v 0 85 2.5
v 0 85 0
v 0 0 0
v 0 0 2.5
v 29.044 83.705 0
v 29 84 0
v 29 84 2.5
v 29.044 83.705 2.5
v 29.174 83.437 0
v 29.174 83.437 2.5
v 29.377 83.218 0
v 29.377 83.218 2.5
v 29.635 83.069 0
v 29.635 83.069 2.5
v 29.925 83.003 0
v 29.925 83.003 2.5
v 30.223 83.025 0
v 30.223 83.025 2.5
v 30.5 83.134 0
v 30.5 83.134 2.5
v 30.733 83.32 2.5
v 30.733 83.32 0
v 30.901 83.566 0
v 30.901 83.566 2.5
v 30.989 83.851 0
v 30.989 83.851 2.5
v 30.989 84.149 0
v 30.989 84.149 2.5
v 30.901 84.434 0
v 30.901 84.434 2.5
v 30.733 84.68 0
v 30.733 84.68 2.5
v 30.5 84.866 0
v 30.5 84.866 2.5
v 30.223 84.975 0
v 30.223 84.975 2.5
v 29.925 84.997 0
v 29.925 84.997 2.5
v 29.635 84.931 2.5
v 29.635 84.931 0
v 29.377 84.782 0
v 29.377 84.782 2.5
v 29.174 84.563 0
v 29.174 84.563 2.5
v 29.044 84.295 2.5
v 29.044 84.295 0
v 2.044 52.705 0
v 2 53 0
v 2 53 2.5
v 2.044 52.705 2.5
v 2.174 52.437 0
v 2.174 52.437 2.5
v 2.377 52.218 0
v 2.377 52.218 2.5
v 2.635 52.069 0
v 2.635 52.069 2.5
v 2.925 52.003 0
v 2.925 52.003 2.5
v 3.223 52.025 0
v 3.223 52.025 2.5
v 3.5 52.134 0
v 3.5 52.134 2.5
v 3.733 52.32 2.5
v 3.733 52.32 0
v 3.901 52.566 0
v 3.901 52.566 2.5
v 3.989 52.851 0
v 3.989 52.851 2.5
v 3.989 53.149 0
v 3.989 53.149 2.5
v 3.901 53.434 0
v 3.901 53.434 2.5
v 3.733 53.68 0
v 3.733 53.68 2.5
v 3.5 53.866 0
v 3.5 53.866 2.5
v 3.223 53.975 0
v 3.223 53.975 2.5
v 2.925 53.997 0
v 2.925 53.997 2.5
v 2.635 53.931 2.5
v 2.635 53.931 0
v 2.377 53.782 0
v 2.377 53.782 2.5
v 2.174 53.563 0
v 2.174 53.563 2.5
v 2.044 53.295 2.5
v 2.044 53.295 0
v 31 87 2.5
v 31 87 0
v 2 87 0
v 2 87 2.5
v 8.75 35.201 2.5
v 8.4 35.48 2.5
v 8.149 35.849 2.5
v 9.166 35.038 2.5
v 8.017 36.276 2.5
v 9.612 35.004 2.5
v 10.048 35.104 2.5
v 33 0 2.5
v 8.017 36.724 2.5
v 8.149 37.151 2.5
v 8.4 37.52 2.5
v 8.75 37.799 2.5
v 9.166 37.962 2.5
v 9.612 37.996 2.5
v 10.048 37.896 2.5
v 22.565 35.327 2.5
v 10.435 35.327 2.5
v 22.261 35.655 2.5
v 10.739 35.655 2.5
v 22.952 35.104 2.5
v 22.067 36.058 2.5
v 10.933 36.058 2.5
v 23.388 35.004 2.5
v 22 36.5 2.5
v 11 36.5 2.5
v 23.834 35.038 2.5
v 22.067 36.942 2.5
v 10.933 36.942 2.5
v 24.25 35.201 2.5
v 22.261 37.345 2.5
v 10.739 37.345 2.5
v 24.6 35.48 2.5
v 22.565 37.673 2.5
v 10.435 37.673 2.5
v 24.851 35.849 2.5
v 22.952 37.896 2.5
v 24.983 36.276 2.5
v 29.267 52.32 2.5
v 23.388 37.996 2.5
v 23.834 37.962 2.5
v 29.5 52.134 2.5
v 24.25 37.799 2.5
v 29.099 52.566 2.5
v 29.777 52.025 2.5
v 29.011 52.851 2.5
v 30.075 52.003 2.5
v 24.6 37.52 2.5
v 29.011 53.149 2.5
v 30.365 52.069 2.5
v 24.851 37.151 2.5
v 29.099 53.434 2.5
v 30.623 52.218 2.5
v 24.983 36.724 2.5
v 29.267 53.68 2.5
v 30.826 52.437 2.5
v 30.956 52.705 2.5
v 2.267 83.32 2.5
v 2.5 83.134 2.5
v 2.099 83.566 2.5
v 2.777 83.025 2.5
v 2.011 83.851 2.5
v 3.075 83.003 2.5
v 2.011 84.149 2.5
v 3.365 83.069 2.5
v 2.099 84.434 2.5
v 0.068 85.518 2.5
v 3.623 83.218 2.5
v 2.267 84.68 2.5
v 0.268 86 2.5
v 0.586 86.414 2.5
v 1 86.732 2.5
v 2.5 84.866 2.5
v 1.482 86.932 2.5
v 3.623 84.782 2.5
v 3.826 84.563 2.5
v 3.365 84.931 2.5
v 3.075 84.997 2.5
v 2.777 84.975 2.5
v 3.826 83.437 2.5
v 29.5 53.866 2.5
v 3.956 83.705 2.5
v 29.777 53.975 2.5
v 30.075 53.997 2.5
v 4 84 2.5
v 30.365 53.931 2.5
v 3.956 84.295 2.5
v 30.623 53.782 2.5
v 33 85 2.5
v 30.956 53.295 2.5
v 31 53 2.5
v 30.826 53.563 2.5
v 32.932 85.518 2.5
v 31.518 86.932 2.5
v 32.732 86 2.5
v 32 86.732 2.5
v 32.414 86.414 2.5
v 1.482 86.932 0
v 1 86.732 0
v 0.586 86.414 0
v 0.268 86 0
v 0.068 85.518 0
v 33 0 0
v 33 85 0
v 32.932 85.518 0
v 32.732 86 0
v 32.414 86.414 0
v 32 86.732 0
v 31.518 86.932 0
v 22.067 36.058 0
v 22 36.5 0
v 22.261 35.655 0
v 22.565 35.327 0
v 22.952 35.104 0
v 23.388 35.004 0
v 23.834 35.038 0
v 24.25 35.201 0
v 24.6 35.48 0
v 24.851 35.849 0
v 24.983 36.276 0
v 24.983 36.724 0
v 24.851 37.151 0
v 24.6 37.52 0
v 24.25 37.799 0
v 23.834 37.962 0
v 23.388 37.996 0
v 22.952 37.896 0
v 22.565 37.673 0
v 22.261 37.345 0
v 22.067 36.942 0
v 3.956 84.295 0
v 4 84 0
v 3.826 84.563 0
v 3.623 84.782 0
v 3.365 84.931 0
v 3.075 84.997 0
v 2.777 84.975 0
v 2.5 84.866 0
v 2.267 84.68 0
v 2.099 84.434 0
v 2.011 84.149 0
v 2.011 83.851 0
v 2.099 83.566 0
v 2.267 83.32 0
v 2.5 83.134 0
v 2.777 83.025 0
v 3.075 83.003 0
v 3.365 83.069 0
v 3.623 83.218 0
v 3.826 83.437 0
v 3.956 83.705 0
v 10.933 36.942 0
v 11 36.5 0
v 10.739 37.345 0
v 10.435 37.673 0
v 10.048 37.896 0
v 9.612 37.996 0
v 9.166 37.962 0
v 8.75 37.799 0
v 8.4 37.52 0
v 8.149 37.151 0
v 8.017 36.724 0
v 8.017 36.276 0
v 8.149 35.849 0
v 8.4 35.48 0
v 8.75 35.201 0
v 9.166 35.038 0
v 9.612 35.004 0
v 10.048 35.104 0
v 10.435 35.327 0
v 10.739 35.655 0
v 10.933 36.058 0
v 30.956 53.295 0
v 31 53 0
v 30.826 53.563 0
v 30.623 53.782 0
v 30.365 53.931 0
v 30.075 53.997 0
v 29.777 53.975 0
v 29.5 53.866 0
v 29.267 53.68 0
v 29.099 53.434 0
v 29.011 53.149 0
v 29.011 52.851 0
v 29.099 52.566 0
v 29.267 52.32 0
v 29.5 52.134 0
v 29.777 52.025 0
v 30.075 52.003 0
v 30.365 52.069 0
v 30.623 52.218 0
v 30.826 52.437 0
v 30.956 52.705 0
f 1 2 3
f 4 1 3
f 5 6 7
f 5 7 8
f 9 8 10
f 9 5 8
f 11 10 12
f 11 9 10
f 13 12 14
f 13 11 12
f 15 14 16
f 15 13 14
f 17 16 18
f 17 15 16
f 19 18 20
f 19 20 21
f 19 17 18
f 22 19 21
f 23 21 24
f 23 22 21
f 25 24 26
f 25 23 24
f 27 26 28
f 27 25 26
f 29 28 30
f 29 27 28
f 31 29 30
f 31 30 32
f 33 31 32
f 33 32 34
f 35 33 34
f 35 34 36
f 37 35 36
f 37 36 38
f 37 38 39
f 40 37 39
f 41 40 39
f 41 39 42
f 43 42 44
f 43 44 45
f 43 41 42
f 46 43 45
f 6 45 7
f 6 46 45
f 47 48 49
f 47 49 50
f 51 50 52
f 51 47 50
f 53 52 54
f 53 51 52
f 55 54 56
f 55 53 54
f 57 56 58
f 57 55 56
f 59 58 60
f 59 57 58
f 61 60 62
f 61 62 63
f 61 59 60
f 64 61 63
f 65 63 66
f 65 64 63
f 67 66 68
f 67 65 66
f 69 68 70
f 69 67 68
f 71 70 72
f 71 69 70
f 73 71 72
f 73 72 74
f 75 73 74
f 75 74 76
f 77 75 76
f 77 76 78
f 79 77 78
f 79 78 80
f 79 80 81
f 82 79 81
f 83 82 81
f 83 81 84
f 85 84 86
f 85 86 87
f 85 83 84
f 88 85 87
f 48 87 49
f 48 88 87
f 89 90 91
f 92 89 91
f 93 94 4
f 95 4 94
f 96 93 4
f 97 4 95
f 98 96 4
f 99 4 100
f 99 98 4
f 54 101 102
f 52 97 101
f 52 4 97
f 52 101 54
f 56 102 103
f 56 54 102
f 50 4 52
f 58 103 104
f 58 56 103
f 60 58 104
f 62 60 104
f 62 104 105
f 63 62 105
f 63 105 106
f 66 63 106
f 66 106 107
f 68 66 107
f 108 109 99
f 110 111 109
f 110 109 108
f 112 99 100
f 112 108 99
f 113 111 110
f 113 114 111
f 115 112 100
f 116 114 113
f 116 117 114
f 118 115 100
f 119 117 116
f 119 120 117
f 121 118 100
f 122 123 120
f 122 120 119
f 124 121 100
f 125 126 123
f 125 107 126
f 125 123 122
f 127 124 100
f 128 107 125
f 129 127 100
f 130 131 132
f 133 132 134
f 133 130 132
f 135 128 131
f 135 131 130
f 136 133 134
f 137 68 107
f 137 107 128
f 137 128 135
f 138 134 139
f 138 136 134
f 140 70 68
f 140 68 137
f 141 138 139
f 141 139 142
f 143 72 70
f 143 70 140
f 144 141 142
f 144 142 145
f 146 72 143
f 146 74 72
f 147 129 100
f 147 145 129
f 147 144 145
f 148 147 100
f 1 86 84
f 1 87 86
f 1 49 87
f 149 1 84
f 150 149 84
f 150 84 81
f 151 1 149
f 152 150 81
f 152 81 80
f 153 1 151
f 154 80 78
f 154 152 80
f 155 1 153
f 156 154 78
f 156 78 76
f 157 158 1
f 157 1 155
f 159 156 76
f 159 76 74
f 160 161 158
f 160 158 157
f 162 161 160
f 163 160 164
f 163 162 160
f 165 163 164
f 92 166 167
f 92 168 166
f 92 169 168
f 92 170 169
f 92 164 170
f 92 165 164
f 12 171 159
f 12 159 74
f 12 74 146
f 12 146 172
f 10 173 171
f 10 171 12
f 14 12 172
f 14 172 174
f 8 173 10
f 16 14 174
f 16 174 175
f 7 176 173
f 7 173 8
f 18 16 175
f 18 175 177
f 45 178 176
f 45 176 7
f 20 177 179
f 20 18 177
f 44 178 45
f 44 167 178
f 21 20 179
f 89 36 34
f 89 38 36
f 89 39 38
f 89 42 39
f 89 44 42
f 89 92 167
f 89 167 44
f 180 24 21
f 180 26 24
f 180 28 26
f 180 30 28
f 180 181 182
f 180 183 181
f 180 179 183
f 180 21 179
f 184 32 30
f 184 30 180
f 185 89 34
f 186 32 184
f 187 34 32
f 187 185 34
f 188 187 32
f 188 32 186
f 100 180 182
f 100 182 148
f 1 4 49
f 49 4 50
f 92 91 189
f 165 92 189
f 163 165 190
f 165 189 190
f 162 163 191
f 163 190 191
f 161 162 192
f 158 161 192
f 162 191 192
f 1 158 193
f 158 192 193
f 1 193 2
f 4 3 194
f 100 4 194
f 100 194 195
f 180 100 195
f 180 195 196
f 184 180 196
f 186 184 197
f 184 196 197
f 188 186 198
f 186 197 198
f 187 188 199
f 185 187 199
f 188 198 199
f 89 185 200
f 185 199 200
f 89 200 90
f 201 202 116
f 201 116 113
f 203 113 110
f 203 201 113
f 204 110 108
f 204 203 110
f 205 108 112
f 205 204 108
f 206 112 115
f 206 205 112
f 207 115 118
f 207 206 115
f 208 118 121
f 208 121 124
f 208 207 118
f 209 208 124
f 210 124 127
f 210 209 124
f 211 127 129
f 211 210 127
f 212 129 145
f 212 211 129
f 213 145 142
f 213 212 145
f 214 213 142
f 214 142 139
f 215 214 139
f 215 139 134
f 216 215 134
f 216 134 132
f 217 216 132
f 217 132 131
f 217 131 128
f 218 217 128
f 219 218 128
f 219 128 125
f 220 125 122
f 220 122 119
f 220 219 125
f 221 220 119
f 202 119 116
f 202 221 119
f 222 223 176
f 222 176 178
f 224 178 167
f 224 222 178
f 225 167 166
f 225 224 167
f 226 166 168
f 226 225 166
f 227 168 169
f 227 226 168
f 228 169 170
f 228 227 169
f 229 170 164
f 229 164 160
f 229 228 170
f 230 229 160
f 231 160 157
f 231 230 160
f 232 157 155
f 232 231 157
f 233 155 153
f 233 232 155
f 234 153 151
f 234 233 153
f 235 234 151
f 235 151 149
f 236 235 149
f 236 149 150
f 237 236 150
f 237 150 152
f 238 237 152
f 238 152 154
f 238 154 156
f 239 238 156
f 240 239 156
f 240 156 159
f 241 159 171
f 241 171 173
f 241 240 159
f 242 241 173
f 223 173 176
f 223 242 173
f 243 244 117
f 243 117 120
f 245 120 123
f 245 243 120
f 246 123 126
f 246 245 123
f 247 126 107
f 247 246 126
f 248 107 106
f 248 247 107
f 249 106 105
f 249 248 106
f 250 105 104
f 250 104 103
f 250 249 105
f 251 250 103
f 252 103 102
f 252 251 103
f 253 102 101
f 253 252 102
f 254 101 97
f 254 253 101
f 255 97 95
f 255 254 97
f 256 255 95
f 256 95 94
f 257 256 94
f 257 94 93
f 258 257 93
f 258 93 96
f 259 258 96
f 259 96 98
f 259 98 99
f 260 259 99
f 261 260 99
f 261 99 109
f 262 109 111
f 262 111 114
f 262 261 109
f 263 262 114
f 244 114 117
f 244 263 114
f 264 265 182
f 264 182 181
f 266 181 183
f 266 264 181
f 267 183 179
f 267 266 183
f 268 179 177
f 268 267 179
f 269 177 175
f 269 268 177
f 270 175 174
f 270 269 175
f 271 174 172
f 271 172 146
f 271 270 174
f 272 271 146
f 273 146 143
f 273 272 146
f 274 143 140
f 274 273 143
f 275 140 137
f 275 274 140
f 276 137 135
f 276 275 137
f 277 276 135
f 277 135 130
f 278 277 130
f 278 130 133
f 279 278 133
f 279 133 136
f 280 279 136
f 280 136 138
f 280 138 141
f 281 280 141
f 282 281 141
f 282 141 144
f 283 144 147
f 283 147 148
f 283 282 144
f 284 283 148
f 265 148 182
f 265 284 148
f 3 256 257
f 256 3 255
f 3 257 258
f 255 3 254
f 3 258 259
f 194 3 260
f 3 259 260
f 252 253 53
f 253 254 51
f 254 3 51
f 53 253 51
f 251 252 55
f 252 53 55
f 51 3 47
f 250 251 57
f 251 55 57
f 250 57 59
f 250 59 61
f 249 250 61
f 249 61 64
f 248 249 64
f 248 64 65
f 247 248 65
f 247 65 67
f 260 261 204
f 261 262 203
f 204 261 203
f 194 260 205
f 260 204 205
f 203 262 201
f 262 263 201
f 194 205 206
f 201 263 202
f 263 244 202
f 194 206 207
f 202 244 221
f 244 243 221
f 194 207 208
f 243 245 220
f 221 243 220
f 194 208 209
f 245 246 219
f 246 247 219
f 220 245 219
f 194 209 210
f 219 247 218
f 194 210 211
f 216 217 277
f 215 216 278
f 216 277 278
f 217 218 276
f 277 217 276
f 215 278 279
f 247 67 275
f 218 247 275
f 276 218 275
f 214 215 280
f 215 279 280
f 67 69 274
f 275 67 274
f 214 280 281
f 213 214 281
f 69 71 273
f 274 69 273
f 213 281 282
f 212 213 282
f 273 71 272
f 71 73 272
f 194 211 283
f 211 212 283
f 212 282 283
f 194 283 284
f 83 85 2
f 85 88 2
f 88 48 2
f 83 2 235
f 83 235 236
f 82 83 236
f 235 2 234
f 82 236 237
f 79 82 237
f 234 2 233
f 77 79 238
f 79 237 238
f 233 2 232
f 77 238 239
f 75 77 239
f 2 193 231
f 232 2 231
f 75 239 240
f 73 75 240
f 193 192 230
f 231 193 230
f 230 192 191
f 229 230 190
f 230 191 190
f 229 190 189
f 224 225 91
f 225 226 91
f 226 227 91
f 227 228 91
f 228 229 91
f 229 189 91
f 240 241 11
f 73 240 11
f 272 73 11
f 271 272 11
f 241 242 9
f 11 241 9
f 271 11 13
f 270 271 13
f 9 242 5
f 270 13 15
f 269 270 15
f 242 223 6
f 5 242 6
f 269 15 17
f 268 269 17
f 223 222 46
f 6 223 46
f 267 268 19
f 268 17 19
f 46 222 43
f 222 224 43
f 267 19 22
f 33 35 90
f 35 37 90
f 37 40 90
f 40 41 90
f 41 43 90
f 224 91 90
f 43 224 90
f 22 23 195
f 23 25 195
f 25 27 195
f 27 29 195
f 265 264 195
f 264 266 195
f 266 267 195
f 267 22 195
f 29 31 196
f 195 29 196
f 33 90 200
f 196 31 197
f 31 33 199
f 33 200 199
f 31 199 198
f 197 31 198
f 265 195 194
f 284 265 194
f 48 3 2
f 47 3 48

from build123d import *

# Parameters (mm, degrees)
SKETCH1_R           = 1
SKETCH1_R_2         = 1.5
BOSS_EXTRUDE1_DEPTH = 2.5


with BuildPart() as part:
    # Sketch1 → Boss-Extrude1 (new body)
    with BuildSketch(Plane.XY):
        with BuildLine():
            Line((0, 0), (33, 0))
            Line((33, 0), (33, 85))
            ThreePointArc((33, 85), (32.414213562, 86.414213562), (31, 87))
            Line((31, 87), (2, 87))
            ThreePointArc((2, 87), (0.585786438, 86.414213562), (0, 85))
            Line((0, 85), (0, 0))
        make_face()
        with Locations((3, 84)):
            Circle(SKETCH1_R, mode=Mode.SUBTRACT)
        with Locations(Location((3, 53, 0), (0, 0, 180))):
            Circle(SKETCH1_R, mode=Mode.SUBTRACT)
        with Locations((9.5, 36.5)):
            Circle(SKETCH1_R_2, mode=Mode.SUBTRACT)
        with Locations(Location((23.5, 36.5, 0), (0, 0, 180))):
            Circle(SKETCH1_R_2, mode=Mode.SUBTRACT)
        with Locations((30, 53)):
            Circle(SKETCH1_R, mode=Mode.SUBTRACT)
        with Locations(Location((30, 84, 0), (0, 0, 180))):
            Circle(SKETCH1_R, mode=Mode.SUBTRACT)
    extrude(amount=BOSS_EXTRUDE1_DEPTH)


solid = part.part
